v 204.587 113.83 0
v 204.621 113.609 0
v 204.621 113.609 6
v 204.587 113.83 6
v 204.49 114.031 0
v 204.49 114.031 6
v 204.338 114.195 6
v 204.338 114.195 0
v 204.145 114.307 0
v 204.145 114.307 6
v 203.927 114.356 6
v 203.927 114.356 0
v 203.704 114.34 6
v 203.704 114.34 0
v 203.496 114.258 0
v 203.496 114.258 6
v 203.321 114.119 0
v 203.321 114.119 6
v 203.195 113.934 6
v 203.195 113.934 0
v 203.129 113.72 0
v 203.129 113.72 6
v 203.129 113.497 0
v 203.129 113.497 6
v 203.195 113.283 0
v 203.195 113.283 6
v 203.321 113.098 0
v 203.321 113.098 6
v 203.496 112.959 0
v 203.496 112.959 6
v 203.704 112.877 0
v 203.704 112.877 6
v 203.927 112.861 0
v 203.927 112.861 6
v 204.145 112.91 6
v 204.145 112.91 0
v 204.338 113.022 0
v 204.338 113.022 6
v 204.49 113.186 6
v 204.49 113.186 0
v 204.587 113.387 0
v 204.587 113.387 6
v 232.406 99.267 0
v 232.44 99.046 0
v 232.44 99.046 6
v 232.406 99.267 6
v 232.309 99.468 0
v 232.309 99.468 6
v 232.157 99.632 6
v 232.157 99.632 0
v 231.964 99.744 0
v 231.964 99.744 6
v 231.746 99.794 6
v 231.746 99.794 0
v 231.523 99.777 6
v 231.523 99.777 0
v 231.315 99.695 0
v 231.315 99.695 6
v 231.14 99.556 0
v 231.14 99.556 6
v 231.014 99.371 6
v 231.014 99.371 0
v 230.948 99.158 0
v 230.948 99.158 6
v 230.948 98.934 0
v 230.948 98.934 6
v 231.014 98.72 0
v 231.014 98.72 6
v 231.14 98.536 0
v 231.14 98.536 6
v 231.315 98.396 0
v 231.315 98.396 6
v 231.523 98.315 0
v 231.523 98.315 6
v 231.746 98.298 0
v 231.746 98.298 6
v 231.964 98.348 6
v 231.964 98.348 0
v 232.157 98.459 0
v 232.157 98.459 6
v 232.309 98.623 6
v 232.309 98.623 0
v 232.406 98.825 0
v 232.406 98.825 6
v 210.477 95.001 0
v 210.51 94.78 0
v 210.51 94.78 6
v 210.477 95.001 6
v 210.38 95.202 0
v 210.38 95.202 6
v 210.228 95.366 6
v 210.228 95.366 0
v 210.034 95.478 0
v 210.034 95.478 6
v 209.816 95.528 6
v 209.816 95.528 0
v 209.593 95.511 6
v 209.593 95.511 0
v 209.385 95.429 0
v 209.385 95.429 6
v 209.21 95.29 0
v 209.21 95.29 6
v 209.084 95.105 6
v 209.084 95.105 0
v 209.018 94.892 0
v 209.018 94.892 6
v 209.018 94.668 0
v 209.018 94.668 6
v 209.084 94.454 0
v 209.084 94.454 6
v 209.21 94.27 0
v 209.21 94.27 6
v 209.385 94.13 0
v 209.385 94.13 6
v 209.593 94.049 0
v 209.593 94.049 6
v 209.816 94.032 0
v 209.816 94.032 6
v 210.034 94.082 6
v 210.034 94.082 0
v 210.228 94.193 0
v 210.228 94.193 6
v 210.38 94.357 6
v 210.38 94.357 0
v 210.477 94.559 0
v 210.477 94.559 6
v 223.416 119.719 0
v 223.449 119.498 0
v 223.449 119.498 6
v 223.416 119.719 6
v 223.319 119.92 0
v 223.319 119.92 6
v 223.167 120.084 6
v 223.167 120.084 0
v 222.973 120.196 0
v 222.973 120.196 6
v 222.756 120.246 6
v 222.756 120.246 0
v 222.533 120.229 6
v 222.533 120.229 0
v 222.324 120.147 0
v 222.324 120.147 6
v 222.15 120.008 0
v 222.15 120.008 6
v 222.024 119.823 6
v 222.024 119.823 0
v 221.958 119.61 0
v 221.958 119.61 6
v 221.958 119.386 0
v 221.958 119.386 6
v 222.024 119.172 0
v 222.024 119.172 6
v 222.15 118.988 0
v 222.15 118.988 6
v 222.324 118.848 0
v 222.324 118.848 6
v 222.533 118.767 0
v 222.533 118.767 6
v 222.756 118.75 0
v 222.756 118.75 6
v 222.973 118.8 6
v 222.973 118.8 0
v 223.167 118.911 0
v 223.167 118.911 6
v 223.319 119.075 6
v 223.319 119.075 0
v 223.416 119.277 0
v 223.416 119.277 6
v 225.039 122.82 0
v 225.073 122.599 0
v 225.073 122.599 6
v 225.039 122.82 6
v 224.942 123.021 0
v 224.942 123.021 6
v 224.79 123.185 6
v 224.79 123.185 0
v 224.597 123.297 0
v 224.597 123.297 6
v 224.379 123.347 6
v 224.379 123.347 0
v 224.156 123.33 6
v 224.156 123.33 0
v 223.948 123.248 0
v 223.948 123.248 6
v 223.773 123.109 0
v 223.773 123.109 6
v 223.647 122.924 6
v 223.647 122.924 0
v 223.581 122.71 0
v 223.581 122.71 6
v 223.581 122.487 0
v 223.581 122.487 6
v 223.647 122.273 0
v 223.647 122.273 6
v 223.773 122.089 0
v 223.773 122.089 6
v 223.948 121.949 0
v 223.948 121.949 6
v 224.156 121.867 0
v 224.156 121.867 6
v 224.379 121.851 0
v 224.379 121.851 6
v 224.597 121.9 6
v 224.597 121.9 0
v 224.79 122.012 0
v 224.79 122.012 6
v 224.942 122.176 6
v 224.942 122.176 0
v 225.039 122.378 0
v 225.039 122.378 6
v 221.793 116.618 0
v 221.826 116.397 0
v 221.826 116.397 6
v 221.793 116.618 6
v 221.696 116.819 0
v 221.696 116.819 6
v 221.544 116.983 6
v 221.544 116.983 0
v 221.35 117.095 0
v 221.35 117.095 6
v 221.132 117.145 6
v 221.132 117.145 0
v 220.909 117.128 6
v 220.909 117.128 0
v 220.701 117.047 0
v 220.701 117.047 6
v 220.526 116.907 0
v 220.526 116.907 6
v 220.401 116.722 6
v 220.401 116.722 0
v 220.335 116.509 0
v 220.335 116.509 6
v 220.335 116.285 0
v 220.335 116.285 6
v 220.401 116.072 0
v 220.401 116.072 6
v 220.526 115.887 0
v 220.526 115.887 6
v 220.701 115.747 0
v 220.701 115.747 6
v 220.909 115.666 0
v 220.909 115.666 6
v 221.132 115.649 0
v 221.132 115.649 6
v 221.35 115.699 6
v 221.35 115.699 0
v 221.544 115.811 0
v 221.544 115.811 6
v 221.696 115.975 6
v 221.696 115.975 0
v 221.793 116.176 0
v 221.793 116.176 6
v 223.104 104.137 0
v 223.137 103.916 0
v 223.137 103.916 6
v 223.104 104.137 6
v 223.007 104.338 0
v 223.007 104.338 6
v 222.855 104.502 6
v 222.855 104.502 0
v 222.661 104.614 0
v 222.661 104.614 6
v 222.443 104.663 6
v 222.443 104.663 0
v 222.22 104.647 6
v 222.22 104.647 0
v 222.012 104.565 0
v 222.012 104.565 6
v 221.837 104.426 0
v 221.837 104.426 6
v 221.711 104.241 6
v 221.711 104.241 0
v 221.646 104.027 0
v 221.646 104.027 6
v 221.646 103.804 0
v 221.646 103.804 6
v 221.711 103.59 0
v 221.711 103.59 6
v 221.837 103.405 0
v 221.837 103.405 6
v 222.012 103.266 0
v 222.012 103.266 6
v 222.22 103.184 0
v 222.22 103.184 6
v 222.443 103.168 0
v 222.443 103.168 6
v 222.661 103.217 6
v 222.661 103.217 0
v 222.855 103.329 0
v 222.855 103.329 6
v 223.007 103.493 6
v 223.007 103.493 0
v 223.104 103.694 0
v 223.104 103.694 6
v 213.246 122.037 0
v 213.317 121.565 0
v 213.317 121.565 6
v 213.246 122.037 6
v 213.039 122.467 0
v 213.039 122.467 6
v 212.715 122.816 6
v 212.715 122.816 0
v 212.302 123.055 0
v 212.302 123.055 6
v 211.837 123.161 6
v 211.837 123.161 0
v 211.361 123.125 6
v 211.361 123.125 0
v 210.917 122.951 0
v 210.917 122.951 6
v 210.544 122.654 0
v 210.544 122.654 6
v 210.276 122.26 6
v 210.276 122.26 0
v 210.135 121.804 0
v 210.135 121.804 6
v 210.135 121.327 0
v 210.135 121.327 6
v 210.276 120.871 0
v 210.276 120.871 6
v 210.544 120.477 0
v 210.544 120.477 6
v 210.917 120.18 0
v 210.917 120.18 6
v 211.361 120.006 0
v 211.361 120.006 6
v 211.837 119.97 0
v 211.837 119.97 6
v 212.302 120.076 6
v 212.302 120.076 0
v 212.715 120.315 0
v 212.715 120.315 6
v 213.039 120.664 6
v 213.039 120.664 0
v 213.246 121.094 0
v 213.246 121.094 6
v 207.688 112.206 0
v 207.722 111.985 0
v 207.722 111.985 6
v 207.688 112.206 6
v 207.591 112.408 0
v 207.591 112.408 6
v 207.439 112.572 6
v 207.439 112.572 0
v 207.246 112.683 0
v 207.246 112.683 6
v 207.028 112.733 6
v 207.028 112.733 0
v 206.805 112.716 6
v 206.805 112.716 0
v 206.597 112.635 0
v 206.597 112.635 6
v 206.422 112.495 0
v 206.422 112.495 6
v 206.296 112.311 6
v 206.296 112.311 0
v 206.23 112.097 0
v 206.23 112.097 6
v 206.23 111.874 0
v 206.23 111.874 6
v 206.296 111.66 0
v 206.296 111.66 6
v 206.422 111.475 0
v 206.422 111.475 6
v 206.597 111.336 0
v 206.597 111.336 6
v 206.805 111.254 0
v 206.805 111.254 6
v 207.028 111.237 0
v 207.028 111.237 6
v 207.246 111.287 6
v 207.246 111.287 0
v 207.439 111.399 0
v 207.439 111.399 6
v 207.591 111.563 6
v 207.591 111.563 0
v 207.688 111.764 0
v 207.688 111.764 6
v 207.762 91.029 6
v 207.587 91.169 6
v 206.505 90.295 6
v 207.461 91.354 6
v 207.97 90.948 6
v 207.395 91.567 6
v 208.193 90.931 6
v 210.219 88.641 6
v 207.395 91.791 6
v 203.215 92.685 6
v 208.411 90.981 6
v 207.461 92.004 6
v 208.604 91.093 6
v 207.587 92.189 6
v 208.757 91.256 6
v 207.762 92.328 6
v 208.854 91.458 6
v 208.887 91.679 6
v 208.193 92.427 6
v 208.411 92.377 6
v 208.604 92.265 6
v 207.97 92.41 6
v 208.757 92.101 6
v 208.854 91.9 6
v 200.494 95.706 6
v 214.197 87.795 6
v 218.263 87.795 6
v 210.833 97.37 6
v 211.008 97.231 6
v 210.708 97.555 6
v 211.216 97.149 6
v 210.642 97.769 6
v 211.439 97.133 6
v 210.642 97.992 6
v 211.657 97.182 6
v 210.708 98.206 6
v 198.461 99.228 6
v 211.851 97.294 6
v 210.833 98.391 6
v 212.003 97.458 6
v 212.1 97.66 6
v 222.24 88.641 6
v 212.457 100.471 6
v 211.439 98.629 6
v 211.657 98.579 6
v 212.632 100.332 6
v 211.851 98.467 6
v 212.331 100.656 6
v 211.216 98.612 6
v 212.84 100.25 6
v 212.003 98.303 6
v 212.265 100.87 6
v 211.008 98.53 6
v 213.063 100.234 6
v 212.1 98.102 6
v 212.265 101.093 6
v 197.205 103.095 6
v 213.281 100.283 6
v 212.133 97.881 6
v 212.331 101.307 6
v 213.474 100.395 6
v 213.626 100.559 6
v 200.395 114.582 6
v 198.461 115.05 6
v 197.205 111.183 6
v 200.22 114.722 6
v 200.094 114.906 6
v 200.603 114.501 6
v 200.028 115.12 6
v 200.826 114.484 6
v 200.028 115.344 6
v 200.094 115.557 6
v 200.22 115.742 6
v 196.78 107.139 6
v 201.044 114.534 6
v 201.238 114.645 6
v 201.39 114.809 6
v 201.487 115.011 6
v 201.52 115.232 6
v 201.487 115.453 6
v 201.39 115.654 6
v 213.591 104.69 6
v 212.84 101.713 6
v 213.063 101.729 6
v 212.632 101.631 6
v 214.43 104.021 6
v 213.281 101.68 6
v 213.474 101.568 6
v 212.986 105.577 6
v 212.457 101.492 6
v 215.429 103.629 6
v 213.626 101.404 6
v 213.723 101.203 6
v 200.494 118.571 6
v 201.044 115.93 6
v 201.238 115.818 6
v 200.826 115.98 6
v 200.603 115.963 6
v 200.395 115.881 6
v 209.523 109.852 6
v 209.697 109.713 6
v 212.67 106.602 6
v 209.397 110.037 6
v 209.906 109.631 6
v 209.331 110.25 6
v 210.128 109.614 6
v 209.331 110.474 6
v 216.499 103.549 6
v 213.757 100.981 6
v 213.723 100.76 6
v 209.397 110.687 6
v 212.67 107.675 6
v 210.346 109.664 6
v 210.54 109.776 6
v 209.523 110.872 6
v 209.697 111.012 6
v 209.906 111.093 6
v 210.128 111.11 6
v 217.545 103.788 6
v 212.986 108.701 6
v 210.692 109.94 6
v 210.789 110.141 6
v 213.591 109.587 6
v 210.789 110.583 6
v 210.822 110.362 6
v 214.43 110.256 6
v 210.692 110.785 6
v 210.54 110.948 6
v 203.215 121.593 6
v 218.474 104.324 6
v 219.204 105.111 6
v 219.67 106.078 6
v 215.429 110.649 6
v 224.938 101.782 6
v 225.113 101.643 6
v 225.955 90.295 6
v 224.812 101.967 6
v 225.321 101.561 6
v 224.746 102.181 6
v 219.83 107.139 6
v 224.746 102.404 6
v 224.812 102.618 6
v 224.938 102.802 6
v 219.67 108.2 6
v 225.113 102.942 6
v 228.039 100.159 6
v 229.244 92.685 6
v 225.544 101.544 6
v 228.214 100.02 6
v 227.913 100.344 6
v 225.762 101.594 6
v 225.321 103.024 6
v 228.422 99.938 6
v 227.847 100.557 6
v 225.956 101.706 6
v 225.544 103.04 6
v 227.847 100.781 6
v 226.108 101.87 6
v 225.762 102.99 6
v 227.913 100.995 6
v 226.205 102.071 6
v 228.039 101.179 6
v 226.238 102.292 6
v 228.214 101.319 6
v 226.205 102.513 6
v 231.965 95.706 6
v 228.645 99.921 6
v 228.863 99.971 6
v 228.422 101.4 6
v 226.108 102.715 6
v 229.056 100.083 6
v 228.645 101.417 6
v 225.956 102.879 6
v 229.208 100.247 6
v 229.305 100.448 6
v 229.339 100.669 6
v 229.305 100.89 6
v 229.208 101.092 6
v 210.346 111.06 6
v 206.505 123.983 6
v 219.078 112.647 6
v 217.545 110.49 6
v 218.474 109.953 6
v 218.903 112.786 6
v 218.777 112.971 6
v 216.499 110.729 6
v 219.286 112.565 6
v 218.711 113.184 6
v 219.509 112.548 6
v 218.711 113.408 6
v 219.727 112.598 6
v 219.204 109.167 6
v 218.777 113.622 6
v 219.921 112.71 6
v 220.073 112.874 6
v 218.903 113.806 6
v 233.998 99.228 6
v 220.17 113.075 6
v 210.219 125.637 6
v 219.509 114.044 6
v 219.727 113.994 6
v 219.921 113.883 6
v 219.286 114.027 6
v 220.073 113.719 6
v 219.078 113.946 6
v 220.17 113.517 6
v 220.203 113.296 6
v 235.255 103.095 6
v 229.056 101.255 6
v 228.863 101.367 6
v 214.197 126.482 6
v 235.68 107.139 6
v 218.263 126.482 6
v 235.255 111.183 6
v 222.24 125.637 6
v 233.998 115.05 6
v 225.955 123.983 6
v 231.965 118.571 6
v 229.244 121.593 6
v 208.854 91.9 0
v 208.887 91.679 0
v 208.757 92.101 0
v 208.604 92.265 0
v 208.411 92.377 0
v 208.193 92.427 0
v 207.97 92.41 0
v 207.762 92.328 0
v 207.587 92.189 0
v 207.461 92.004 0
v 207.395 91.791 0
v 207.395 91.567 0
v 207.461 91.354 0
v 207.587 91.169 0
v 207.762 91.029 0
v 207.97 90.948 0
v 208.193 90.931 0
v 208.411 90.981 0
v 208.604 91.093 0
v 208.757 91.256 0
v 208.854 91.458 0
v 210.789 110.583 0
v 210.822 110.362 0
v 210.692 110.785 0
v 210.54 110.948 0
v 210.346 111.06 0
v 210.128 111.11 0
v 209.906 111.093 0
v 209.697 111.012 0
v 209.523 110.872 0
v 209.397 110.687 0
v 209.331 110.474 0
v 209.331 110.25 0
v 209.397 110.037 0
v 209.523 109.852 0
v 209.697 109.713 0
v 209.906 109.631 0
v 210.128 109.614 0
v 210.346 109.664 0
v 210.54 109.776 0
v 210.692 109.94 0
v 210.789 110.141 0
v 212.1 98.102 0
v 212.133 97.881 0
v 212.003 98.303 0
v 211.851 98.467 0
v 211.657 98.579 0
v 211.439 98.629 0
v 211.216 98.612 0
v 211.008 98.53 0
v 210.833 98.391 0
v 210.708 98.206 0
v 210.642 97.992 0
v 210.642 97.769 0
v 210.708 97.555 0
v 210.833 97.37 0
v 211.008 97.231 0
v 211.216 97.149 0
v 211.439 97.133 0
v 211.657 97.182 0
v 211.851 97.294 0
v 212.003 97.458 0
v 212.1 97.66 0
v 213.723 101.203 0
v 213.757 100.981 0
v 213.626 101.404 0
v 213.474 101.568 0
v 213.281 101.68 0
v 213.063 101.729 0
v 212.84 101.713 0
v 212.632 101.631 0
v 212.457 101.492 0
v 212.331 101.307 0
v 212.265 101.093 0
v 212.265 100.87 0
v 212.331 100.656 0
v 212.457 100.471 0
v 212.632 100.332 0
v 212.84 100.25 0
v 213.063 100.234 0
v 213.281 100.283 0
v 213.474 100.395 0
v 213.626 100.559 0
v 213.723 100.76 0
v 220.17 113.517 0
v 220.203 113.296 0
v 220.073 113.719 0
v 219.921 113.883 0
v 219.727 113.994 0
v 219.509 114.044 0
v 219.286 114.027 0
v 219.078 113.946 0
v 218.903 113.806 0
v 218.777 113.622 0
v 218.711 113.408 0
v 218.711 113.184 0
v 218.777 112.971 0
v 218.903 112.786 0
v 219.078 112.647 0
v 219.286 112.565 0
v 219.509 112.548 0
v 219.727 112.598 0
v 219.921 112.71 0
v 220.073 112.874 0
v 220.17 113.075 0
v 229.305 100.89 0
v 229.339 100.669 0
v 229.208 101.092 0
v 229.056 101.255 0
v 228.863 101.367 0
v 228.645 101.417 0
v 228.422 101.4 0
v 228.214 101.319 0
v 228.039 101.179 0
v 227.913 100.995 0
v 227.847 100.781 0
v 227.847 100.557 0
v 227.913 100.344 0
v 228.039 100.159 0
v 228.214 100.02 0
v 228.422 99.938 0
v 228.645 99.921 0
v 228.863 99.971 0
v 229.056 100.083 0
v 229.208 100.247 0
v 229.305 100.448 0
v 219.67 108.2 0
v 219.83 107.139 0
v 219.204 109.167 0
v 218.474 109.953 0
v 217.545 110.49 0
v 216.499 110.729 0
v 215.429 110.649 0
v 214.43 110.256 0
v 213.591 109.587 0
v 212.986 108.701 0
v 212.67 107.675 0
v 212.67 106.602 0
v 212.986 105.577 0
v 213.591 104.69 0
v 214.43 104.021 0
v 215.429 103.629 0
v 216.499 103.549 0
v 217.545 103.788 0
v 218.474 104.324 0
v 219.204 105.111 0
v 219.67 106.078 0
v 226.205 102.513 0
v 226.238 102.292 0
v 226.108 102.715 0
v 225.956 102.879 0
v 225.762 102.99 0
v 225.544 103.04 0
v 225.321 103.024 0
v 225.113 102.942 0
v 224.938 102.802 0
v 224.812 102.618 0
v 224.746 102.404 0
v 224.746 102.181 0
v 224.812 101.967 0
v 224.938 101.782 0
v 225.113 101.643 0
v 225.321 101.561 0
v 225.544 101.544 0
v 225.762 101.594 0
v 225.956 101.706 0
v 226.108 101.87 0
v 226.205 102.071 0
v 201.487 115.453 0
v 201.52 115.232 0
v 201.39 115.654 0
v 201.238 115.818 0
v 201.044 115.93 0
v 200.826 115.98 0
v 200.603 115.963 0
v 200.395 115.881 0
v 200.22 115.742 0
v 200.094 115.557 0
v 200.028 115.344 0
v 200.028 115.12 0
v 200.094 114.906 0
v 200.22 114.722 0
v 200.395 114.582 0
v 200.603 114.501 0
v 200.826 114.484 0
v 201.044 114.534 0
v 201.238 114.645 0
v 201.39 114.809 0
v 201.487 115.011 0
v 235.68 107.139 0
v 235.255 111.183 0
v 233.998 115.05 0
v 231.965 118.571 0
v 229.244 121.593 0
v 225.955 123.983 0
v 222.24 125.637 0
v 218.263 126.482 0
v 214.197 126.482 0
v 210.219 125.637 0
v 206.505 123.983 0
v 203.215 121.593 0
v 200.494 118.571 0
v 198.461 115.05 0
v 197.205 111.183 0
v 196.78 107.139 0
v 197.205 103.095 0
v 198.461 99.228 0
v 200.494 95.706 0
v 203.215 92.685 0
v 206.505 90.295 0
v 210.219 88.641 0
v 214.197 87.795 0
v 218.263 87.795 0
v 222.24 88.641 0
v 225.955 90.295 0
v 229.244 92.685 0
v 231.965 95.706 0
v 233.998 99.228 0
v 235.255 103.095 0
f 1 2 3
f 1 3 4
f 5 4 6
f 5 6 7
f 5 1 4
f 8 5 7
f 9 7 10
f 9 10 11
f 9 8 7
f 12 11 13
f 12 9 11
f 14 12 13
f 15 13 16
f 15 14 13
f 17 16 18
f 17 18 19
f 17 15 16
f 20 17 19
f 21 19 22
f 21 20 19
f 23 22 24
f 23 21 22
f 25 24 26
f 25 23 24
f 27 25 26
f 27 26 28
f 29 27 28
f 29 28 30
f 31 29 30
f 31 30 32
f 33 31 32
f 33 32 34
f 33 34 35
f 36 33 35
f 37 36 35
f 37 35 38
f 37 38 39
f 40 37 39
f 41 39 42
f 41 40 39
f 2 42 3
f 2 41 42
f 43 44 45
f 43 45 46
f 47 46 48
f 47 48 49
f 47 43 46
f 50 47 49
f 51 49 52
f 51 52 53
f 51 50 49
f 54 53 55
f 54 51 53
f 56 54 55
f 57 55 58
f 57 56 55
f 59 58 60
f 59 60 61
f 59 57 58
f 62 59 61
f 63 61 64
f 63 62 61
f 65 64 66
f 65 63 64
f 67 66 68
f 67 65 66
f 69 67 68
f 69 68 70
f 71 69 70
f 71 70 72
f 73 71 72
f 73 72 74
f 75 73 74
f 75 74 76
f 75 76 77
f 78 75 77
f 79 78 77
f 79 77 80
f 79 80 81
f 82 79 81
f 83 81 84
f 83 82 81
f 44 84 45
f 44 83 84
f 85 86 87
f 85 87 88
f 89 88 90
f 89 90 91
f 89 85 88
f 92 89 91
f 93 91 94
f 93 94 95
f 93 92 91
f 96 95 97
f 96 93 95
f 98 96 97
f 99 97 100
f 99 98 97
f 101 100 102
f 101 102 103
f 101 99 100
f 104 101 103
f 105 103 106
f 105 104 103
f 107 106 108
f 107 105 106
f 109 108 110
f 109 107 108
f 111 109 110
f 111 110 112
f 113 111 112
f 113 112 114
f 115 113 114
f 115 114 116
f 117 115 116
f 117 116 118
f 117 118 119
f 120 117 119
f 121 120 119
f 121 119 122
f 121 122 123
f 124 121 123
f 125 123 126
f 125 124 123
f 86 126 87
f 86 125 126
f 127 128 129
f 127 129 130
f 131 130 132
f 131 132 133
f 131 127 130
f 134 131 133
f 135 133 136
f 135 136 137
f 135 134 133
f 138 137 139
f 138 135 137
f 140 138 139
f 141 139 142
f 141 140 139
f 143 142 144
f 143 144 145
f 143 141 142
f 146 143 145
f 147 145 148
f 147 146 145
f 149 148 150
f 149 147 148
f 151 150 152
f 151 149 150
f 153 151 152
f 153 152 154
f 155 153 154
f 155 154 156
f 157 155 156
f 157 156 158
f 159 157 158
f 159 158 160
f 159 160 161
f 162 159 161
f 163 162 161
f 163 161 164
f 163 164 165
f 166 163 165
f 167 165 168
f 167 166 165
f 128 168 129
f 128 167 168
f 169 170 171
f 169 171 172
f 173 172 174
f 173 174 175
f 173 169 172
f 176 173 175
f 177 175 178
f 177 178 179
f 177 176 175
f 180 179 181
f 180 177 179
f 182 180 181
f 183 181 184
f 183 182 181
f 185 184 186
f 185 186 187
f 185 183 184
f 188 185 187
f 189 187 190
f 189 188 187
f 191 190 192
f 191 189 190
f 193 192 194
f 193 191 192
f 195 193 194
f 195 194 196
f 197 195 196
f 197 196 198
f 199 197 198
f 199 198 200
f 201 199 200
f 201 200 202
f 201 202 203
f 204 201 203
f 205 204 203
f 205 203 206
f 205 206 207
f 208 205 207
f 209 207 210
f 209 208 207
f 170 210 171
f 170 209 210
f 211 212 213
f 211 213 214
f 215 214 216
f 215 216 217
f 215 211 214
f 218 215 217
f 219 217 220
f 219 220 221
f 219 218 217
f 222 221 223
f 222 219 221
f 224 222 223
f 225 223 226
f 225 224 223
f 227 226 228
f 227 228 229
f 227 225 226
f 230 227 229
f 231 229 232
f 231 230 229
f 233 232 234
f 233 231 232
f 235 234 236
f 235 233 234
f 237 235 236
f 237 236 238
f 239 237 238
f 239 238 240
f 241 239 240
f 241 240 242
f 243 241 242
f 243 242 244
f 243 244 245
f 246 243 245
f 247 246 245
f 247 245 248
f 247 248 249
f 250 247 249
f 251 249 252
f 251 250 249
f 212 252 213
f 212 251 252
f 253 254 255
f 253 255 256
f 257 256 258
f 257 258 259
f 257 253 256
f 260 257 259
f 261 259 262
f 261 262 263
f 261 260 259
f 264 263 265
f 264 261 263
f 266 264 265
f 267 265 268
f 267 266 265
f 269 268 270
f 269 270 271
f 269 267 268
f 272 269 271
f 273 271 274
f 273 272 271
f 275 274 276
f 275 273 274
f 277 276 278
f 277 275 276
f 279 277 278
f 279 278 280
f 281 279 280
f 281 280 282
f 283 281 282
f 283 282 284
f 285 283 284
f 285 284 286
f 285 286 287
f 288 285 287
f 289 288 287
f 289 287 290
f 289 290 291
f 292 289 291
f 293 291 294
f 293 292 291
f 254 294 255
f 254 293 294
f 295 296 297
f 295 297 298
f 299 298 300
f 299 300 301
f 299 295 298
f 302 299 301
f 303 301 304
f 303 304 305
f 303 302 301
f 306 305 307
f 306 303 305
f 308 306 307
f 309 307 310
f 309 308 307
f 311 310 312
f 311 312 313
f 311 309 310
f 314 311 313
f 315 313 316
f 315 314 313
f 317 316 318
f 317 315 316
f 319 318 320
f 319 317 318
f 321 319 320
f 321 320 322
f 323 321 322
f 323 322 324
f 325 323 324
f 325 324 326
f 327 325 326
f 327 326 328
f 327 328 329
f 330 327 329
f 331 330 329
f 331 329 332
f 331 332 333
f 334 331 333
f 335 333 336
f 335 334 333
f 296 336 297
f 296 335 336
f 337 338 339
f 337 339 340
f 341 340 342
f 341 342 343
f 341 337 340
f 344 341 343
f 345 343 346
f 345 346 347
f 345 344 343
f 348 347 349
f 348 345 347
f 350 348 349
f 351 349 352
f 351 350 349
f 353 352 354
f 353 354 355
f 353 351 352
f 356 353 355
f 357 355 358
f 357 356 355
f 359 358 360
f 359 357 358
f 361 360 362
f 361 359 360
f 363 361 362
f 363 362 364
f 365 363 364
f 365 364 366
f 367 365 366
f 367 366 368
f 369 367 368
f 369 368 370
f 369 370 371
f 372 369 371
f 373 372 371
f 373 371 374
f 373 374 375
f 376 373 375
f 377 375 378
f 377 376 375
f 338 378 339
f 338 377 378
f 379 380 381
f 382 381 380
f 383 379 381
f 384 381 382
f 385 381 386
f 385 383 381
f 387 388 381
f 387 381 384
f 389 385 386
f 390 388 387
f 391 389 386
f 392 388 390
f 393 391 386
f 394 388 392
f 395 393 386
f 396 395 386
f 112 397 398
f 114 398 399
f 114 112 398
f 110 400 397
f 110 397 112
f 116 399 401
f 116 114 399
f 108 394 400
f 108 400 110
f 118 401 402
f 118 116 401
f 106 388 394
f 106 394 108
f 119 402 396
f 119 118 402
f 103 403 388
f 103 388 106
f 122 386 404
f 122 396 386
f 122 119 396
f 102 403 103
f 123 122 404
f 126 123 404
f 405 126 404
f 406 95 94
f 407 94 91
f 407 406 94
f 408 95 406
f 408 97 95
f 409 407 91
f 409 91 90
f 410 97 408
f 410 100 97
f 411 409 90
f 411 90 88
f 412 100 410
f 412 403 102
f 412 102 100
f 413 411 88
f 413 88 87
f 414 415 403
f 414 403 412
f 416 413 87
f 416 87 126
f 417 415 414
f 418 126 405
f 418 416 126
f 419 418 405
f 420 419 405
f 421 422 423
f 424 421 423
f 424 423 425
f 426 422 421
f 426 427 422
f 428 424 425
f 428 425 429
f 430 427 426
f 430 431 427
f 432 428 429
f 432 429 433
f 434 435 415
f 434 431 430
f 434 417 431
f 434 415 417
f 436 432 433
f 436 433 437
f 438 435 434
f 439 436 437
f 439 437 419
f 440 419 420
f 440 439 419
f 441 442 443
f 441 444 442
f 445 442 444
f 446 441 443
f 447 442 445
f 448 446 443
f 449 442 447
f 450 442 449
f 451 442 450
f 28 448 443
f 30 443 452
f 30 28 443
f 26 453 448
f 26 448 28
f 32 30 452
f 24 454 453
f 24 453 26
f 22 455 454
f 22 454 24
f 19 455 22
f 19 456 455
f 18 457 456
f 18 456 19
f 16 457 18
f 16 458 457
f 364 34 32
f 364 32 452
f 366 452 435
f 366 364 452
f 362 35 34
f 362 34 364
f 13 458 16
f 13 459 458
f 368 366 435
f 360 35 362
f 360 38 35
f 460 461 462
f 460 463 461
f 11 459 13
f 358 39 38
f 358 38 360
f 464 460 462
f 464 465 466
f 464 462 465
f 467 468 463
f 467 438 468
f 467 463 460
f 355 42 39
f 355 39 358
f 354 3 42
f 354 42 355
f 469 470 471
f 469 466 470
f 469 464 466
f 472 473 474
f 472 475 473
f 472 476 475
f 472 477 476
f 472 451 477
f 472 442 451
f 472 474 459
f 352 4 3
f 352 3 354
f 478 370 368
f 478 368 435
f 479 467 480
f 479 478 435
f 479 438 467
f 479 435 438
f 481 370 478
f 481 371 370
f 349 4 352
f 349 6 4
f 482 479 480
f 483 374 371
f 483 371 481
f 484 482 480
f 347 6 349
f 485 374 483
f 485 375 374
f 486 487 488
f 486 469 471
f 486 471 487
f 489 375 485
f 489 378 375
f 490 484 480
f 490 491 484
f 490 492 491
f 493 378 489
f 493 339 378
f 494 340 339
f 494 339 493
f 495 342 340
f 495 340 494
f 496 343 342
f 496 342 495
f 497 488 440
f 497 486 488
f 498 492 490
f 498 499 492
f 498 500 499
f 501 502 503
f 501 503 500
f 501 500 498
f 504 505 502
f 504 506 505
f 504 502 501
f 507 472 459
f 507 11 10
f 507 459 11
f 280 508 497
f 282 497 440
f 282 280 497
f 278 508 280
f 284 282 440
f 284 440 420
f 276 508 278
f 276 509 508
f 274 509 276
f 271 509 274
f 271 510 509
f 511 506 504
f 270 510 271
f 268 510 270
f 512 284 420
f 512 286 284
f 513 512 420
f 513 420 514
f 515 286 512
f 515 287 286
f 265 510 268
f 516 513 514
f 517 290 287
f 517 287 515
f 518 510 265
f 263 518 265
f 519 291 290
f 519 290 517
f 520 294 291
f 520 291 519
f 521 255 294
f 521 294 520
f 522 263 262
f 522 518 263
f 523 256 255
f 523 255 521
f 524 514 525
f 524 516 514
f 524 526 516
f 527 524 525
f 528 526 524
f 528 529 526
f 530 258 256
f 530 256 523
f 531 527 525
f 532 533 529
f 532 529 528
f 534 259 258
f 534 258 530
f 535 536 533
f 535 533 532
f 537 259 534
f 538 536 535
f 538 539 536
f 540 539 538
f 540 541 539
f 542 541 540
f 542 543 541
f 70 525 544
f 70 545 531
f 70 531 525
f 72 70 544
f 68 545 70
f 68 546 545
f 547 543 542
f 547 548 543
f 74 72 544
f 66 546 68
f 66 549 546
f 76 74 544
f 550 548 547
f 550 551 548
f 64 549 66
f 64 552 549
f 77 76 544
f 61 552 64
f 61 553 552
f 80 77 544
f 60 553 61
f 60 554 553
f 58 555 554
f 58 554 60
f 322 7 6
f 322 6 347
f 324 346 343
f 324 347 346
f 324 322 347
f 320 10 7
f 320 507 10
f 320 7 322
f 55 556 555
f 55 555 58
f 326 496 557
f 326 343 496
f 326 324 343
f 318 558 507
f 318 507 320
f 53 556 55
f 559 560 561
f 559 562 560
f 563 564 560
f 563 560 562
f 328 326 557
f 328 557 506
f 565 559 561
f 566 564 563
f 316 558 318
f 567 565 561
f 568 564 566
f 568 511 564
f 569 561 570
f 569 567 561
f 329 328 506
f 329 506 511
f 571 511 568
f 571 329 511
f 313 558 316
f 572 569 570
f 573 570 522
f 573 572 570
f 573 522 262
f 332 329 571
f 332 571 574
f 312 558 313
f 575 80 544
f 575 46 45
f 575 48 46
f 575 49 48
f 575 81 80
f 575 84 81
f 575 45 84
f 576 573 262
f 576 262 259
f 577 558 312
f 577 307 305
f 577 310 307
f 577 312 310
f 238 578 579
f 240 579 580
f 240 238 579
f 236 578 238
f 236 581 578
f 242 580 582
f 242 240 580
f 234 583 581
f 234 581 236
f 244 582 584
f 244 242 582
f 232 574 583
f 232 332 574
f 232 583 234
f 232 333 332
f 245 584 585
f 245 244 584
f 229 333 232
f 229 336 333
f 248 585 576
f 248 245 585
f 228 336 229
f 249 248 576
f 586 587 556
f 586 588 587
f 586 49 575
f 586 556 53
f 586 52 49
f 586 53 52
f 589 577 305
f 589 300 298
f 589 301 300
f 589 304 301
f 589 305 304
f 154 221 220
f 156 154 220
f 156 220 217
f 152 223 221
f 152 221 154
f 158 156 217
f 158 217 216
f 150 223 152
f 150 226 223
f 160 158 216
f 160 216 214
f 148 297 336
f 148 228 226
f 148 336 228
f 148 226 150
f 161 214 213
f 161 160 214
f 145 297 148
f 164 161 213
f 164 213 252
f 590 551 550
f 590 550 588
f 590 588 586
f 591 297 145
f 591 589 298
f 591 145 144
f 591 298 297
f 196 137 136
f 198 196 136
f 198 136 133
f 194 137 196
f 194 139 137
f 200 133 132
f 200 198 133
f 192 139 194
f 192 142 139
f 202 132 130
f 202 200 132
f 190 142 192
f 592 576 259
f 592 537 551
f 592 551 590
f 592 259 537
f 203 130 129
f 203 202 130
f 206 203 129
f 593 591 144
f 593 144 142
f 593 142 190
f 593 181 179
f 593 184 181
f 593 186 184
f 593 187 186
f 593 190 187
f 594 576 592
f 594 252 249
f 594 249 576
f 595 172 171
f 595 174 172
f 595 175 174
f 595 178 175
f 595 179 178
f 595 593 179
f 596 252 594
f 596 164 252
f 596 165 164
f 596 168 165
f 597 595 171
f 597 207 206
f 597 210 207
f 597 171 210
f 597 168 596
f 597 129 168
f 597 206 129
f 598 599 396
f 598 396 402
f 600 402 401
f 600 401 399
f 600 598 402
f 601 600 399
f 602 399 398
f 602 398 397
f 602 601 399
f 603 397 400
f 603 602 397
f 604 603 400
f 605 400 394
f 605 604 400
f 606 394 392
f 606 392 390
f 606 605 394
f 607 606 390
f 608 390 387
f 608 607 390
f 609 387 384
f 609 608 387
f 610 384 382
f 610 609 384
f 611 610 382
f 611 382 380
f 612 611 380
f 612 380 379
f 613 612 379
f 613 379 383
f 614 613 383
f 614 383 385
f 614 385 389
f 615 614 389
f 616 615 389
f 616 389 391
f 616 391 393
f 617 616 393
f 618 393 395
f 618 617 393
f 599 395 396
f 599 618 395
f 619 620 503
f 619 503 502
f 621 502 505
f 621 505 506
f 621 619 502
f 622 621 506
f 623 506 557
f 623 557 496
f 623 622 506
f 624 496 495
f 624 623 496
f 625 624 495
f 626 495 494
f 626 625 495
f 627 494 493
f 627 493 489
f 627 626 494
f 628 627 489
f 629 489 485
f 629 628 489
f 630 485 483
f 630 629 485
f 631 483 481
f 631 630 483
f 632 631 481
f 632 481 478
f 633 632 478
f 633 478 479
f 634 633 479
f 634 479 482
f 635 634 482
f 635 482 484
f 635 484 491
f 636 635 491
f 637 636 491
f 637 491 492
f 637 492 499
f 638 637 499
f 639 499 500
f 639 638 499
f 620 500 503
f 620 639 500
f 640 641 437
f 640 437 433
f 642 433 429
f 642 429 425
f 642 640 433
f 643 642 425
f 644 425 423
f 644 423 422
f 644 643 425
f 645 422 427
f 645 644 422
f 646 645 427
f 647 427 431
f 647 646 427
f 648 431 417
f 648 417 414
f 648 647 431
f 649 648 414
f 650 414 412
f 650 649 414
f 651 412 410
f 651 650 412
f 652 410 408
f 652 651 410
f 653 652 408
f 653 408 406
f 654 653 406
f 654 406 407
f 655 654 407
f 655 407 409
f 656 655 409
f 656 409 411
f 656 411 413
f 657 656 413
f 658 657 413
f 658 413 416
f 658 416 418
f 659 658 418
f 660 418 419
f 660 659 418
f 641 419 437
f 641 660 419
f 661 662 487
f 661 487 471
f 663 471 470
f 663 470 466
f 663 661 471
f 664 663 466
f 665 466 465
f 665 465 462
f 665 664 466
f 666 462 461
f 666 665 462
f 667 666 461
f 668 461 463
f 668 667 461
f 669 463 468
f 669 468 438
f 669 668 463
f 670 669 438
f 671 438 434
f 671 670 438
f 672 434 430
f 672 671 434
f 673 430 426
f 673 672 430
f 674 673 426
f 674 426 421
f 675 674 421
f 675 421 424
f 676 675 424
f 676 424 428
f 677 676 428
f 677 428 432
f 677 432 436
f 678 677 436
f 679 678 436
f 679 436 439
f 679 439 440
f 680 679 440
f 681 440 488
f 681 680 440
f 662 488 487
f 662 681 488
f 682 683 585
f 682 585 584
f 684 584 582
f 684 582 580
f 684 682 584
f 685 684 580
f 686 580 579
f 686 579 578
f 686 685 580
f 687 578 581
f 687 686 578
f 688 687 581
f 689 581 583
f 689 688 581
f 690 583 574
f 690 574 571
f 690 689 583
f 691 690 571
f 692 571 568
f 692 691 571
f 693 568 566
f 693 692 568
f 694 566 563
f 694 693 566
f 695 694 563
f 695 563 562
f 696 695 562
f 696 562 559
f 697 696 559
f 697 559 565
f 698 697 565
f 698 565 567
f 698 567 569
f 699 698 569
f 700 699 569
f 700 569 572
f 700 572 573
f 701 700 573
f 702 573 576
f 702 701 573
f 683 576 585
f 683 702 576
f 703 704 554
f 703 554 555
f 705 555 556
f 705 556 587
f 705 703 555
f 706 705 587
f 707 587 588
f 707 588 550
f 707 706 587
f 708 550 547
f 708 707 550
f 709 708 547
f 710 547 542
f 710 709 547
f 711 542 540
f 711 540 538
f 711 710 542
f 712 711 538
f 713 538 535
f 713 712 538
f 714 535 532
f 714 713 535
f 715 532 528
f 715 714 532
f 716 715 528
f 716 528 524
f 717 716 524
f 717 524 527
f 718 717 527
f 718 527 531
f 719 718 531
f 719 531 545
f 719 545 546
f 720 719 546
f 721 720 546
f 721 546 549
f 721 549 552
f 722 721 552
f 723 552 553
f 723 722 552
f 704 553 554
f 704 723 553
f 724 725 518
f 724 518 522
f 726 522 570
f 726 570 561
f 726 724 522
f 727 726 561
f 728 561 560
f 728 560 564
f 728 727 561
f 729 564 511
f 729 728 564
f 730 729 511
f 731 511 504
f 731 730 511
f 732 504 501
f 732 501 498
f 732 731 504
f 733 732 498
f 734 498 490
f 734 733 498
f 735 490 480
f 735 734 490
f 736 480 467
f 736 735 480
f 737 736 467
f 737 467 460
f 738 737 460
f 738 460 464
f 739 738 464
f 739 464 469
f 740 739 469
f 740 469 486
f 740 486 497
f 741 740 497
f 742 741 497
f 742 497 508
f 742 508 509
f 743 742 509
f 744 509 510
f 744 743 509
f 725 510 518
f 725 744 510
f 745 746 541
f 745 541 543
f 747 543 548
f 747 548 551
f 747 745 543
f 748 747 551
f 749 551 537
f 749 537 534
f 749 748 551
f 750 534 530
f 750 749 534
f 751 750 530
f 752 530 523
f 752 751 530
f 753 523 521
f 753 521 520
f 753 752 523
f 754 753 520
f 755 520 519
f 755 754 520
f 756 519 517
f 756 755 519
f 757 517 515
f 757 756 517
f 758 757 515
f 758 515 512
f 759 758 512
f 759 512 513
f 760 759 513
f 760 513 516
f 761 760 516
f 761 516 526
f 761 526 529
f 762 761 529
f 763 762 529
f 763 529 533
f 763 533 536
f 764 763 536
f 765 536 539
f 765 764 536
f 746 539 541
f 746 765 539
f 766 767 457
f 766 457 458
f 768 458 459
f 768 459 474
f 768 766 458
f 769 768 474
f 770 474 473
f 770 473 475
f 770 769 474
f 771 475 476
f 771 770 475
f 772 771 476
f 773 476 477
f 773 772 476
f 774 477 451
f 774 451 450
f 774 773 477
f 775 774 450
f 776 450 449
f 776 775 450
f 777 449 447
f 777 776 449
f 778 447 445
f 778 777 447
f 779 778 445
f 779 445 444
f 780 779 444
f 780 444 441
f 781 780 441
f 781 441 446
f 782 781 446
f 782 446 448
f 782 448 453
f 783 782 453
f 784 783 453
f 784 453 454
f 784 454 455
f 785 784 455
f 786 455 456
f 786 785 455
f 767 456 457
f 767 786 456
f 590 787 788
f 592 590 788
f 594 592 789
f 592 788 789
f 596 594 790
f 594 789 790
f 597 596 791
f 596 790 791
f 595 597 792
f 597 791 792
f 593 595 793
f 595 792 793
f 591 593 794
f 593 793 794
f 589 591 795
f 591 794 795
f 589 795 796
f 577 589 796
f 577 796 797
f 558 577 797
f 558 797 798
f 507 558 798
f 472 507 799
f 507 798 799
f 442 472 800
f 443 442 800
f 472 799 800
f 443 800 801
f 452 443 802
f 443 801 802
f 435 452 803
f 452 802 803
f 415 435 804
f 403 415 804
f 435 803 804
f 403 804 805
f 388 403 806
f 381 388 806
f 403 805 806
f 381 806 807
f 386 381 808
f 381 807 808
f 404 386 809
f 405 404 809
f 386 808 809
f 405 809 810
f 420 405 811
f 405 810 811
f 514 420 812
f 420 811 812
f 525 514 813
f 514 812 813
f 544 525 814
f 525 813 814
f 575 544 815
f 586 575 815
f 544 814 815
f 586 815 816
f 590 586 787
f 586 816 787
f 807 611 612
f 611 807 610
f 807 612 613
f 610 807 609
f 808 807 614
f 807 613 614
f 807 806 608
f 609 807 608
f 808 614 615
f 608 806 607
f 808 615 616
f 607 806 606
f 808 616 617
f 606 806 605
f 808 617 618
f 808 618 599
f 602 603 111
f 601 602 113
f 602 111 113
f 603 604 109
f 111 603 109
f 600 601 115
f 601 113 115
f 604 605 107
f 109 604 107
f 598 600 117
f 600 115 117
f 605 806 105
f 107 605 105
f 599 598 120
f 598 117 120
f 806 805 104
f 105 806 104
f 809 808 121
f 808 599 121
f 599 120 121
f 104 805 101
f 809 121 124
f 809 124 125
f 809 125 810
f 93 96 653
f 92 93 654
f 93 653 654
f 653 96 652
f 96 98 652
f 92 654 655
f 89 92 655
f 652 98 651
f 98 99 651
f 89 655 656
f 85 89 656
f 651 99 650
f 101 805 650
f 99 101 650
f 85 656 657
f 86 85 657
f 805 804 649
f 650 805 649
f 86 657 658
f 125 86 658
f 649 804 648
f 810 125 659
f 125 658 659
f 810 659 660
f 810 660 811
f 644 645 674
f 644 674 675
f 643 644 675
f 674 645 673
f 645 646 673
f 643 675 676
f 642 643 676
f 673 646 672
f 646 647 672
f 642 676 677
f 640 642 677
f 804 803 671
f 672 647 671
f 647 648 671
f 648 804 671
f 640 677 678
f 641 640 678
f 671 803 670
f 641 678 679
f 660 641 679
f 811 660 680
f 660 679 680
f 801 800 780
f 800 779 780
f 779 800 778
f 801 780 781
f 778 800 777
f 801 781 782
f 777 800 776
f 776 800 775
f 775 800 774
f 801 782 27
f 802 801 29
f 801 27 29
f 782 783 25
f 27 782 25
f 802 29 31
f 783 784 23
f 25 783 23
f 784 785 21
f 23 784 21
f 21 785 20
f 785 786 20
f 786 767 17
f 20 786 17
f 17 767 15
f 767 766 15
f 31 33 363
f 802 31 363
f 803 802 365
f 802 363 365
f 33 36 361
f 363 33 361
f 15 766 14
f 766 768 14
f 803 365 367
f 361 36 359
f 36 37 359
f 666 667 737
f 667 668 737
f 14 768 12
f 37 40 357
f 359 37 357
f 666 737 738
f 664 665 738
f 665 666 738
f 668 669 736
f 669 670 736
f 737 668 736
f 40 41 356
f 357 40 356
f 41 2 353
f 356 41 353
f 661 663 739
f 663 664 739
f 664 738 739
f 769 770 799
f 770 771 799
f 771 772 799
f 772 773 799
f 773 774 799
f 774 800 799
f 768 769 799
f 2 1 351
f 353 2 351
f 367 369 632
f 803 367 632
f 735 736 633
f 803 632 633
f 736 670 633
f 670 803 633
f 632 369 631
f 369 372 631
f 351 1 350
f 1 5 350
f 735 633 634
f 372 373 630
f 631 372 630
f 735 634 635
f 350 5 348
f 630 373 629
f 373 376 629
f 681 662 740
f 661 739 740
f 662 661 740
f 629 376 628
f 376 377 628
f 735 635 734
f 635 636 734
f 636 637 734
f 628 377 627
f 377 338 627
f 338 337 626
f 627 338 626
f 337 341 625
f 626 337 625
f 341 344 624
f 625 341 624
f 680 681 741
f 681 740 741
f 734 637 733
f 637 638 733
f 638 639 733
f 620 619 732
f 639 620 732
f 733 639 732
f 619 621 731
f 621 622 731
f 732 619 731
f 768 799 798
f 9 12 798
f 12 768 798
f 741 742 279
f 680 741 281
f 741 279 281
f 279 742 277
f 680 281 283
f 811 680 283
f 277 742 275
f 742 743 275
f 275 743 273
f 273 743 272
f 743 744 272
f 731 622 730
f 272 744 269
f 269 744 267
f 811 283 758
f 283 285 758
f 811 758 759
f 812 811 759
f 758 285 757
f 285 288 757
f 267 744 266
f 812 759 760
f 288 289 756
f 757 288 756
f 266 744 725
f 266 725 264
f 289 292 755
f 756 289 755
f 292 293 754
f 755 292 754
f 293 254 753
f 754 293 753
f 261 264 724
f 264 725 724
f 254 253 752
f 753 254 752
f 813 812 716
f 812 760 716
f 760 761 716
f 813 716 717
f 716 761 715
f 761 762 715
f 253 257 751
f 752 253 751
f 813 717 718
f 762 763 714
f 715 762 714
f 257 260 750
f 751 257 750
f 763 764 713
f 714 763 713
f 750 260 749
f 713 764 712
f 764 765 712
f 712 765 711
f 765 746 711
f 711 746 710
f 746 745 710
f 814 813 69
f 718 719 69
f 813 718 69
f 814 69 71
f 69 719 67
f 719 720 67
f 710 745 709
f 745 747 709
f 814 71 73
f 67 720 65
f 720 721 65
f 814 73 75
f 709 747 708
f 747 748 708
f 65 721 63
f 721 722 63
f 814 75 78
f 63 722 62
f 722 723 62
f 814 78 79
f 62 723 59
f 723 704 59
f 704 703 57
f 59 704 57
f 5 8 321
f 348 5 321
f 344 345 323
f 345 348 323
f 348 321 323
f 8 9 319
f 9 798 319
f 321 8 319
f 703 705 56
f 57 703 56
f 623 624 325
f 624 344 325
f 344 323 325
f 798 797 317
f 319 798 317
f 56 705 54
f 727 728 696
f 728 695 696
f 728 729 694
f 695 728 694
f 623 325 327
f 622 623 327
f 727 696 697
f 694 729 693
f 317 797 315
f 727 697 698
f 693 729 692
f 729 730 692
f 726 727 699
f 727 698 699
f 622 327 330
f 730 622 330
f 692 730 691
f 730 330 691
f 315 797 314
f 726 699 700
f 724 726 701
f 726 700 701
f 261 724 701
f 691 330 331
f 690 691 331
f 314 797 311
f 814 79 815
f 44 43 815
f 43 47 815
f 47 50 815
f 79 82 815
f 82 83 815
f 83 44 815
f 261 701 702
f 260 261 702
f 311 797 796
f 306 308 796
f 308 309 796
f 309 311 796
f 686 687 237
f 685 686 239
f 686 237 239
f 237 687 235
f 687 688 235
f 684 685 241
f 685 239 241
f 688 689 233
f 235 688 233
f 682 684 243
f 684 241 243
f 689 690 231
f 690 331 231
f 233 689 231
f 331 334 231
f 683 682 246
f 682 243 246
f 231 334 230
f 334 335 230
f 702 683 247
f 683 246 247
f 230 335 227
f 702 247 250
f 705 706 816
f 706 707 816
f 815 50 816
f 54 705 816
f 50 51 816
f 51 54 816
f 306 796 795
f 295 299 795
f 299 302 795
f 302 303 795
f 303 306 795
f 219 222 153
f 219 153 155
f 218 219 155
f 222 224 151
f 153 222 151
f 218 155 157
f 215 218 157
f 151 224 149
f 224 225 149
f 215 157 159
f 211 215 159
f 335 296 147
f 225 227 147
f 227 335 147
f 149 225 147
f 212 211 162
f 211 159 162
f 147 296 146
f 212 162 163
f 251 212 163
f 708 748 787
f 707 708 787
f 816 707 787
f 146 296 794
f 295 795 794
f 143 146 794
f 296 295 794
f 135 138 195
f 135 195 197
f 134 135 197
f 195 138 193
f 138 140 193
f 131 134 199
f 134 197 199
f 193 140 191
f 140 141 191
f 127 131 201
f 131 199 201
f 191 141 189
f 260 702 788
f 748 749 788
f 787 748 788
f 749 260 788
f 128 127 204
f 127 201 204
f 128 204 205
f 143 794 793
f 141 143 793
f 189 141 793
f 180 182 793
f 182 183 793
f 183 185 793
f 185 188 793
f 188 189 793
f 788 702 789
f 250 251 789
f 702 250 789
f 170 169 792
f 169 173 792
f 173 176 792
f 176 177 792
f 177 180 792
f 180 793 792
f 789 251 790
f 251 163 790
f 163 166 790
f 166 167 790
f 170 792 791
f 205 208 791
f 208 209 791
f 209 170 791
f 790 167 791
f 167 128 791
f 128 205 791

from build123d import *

# Parameters (mm, degrees)
SKETCH1_R           = 19.45
SKETCH1_R_2         = 0.75
SKETCH1_R_3         = 3.6
SKETCH1_R_4         = 1.599999975
BOSS_EXTRUDE1_DEPTH = 6


with BuildPart() as part:
    # Sketch1 → Boss-Extrude1 (new body)
    with BuildSketch(Plane.XY):
        with Locations((216.229766611, 107.1388)):
            Circle(SKETCH1_R)
        with Locations((224.322698445, 122.598649751)):
            Circle(SKETCH1_R_2, mode=Mode.SUBTRACT)
        with Locations((222.699474295, 119.497820288)):
            Circle(SKETCH1_R_2, mode=Mode.SUBTRACT)
        with Locations((221.076250145, 116.396990825)):
            Circle(SKETCH1_R_2, mode=Mode.SUBTRACT)
        with Locations((219.453025995, 113.296161362)):
            Circle(SKETCH1_R_2, mode=Mode.SUBTRACT)
        with Locations((231.689616361, 99.045868165)):
            Circle(SKETCH1_R_2, mode=Mode.SUBTRACT)
        with Locations((228.588786898, 100.669092315)):
            Circle(SKETCH1_R_2, mode=Mode.SUBTRACT)
        with Locations((225.487957435, 102.292316466)):
            Circle(SKETCH1_R_2, mode=Mode.SUBTRACT)
        with Locations((222.387127973, 103.915540616)):
            Circle(SKETCH1_R_2, mode=Mode.SUBTRACT)
        with Locations((208.136834776, 91.678950249)):
            Circle(SKETCH1_R_2, mode=Mode.SUBTRACT)
        with Locations((209.760058926, 94.779779712)):
            Circle(SKETCH1_R_2, mode=Mode.SUBTRACT)
        with Locations((211.383283076, 97.880609175)):
            Circle(SKETCH1_R_2, mode=Mode.SUBTRACT)
        with Locations((213.006507226, 100.981438638)):
            Circle(SKETCH1_R_2, mode=Mode.SUBTRACT)
        with Locations((200.76991686, 115.231731835)):
            Circle(SKETCH1_R_2, mode=Mode.SUBTRACT)
        with Locations((203.870746323, 113.608507685)):
            Circle(SKETCH1_R_2, mode=Mode.SUBTRACT)
        with Locations((206.971575786, 111.985283534)):
            Circle(SKETCH1_R_2, mode=Mode.SUBTRACT)
        with Locations((210.072405248, 110.362059384)):
            Circle(SKETCH1_R_2, mode=Mode.SUBTRACT)
        with Locations((216.229766611, 107.1388)):
            Circle(SKETCH1_R_3, mode=Mode.SUBTRACT)
        with Locations((211.717350559, 121.565450451)):
            Circle(SKETCH1_R_4, mode=Mode.SUBTRACT)
    extrude(amount=BOSS_EXTRUDE1_DEPTH)


solid = part.part
